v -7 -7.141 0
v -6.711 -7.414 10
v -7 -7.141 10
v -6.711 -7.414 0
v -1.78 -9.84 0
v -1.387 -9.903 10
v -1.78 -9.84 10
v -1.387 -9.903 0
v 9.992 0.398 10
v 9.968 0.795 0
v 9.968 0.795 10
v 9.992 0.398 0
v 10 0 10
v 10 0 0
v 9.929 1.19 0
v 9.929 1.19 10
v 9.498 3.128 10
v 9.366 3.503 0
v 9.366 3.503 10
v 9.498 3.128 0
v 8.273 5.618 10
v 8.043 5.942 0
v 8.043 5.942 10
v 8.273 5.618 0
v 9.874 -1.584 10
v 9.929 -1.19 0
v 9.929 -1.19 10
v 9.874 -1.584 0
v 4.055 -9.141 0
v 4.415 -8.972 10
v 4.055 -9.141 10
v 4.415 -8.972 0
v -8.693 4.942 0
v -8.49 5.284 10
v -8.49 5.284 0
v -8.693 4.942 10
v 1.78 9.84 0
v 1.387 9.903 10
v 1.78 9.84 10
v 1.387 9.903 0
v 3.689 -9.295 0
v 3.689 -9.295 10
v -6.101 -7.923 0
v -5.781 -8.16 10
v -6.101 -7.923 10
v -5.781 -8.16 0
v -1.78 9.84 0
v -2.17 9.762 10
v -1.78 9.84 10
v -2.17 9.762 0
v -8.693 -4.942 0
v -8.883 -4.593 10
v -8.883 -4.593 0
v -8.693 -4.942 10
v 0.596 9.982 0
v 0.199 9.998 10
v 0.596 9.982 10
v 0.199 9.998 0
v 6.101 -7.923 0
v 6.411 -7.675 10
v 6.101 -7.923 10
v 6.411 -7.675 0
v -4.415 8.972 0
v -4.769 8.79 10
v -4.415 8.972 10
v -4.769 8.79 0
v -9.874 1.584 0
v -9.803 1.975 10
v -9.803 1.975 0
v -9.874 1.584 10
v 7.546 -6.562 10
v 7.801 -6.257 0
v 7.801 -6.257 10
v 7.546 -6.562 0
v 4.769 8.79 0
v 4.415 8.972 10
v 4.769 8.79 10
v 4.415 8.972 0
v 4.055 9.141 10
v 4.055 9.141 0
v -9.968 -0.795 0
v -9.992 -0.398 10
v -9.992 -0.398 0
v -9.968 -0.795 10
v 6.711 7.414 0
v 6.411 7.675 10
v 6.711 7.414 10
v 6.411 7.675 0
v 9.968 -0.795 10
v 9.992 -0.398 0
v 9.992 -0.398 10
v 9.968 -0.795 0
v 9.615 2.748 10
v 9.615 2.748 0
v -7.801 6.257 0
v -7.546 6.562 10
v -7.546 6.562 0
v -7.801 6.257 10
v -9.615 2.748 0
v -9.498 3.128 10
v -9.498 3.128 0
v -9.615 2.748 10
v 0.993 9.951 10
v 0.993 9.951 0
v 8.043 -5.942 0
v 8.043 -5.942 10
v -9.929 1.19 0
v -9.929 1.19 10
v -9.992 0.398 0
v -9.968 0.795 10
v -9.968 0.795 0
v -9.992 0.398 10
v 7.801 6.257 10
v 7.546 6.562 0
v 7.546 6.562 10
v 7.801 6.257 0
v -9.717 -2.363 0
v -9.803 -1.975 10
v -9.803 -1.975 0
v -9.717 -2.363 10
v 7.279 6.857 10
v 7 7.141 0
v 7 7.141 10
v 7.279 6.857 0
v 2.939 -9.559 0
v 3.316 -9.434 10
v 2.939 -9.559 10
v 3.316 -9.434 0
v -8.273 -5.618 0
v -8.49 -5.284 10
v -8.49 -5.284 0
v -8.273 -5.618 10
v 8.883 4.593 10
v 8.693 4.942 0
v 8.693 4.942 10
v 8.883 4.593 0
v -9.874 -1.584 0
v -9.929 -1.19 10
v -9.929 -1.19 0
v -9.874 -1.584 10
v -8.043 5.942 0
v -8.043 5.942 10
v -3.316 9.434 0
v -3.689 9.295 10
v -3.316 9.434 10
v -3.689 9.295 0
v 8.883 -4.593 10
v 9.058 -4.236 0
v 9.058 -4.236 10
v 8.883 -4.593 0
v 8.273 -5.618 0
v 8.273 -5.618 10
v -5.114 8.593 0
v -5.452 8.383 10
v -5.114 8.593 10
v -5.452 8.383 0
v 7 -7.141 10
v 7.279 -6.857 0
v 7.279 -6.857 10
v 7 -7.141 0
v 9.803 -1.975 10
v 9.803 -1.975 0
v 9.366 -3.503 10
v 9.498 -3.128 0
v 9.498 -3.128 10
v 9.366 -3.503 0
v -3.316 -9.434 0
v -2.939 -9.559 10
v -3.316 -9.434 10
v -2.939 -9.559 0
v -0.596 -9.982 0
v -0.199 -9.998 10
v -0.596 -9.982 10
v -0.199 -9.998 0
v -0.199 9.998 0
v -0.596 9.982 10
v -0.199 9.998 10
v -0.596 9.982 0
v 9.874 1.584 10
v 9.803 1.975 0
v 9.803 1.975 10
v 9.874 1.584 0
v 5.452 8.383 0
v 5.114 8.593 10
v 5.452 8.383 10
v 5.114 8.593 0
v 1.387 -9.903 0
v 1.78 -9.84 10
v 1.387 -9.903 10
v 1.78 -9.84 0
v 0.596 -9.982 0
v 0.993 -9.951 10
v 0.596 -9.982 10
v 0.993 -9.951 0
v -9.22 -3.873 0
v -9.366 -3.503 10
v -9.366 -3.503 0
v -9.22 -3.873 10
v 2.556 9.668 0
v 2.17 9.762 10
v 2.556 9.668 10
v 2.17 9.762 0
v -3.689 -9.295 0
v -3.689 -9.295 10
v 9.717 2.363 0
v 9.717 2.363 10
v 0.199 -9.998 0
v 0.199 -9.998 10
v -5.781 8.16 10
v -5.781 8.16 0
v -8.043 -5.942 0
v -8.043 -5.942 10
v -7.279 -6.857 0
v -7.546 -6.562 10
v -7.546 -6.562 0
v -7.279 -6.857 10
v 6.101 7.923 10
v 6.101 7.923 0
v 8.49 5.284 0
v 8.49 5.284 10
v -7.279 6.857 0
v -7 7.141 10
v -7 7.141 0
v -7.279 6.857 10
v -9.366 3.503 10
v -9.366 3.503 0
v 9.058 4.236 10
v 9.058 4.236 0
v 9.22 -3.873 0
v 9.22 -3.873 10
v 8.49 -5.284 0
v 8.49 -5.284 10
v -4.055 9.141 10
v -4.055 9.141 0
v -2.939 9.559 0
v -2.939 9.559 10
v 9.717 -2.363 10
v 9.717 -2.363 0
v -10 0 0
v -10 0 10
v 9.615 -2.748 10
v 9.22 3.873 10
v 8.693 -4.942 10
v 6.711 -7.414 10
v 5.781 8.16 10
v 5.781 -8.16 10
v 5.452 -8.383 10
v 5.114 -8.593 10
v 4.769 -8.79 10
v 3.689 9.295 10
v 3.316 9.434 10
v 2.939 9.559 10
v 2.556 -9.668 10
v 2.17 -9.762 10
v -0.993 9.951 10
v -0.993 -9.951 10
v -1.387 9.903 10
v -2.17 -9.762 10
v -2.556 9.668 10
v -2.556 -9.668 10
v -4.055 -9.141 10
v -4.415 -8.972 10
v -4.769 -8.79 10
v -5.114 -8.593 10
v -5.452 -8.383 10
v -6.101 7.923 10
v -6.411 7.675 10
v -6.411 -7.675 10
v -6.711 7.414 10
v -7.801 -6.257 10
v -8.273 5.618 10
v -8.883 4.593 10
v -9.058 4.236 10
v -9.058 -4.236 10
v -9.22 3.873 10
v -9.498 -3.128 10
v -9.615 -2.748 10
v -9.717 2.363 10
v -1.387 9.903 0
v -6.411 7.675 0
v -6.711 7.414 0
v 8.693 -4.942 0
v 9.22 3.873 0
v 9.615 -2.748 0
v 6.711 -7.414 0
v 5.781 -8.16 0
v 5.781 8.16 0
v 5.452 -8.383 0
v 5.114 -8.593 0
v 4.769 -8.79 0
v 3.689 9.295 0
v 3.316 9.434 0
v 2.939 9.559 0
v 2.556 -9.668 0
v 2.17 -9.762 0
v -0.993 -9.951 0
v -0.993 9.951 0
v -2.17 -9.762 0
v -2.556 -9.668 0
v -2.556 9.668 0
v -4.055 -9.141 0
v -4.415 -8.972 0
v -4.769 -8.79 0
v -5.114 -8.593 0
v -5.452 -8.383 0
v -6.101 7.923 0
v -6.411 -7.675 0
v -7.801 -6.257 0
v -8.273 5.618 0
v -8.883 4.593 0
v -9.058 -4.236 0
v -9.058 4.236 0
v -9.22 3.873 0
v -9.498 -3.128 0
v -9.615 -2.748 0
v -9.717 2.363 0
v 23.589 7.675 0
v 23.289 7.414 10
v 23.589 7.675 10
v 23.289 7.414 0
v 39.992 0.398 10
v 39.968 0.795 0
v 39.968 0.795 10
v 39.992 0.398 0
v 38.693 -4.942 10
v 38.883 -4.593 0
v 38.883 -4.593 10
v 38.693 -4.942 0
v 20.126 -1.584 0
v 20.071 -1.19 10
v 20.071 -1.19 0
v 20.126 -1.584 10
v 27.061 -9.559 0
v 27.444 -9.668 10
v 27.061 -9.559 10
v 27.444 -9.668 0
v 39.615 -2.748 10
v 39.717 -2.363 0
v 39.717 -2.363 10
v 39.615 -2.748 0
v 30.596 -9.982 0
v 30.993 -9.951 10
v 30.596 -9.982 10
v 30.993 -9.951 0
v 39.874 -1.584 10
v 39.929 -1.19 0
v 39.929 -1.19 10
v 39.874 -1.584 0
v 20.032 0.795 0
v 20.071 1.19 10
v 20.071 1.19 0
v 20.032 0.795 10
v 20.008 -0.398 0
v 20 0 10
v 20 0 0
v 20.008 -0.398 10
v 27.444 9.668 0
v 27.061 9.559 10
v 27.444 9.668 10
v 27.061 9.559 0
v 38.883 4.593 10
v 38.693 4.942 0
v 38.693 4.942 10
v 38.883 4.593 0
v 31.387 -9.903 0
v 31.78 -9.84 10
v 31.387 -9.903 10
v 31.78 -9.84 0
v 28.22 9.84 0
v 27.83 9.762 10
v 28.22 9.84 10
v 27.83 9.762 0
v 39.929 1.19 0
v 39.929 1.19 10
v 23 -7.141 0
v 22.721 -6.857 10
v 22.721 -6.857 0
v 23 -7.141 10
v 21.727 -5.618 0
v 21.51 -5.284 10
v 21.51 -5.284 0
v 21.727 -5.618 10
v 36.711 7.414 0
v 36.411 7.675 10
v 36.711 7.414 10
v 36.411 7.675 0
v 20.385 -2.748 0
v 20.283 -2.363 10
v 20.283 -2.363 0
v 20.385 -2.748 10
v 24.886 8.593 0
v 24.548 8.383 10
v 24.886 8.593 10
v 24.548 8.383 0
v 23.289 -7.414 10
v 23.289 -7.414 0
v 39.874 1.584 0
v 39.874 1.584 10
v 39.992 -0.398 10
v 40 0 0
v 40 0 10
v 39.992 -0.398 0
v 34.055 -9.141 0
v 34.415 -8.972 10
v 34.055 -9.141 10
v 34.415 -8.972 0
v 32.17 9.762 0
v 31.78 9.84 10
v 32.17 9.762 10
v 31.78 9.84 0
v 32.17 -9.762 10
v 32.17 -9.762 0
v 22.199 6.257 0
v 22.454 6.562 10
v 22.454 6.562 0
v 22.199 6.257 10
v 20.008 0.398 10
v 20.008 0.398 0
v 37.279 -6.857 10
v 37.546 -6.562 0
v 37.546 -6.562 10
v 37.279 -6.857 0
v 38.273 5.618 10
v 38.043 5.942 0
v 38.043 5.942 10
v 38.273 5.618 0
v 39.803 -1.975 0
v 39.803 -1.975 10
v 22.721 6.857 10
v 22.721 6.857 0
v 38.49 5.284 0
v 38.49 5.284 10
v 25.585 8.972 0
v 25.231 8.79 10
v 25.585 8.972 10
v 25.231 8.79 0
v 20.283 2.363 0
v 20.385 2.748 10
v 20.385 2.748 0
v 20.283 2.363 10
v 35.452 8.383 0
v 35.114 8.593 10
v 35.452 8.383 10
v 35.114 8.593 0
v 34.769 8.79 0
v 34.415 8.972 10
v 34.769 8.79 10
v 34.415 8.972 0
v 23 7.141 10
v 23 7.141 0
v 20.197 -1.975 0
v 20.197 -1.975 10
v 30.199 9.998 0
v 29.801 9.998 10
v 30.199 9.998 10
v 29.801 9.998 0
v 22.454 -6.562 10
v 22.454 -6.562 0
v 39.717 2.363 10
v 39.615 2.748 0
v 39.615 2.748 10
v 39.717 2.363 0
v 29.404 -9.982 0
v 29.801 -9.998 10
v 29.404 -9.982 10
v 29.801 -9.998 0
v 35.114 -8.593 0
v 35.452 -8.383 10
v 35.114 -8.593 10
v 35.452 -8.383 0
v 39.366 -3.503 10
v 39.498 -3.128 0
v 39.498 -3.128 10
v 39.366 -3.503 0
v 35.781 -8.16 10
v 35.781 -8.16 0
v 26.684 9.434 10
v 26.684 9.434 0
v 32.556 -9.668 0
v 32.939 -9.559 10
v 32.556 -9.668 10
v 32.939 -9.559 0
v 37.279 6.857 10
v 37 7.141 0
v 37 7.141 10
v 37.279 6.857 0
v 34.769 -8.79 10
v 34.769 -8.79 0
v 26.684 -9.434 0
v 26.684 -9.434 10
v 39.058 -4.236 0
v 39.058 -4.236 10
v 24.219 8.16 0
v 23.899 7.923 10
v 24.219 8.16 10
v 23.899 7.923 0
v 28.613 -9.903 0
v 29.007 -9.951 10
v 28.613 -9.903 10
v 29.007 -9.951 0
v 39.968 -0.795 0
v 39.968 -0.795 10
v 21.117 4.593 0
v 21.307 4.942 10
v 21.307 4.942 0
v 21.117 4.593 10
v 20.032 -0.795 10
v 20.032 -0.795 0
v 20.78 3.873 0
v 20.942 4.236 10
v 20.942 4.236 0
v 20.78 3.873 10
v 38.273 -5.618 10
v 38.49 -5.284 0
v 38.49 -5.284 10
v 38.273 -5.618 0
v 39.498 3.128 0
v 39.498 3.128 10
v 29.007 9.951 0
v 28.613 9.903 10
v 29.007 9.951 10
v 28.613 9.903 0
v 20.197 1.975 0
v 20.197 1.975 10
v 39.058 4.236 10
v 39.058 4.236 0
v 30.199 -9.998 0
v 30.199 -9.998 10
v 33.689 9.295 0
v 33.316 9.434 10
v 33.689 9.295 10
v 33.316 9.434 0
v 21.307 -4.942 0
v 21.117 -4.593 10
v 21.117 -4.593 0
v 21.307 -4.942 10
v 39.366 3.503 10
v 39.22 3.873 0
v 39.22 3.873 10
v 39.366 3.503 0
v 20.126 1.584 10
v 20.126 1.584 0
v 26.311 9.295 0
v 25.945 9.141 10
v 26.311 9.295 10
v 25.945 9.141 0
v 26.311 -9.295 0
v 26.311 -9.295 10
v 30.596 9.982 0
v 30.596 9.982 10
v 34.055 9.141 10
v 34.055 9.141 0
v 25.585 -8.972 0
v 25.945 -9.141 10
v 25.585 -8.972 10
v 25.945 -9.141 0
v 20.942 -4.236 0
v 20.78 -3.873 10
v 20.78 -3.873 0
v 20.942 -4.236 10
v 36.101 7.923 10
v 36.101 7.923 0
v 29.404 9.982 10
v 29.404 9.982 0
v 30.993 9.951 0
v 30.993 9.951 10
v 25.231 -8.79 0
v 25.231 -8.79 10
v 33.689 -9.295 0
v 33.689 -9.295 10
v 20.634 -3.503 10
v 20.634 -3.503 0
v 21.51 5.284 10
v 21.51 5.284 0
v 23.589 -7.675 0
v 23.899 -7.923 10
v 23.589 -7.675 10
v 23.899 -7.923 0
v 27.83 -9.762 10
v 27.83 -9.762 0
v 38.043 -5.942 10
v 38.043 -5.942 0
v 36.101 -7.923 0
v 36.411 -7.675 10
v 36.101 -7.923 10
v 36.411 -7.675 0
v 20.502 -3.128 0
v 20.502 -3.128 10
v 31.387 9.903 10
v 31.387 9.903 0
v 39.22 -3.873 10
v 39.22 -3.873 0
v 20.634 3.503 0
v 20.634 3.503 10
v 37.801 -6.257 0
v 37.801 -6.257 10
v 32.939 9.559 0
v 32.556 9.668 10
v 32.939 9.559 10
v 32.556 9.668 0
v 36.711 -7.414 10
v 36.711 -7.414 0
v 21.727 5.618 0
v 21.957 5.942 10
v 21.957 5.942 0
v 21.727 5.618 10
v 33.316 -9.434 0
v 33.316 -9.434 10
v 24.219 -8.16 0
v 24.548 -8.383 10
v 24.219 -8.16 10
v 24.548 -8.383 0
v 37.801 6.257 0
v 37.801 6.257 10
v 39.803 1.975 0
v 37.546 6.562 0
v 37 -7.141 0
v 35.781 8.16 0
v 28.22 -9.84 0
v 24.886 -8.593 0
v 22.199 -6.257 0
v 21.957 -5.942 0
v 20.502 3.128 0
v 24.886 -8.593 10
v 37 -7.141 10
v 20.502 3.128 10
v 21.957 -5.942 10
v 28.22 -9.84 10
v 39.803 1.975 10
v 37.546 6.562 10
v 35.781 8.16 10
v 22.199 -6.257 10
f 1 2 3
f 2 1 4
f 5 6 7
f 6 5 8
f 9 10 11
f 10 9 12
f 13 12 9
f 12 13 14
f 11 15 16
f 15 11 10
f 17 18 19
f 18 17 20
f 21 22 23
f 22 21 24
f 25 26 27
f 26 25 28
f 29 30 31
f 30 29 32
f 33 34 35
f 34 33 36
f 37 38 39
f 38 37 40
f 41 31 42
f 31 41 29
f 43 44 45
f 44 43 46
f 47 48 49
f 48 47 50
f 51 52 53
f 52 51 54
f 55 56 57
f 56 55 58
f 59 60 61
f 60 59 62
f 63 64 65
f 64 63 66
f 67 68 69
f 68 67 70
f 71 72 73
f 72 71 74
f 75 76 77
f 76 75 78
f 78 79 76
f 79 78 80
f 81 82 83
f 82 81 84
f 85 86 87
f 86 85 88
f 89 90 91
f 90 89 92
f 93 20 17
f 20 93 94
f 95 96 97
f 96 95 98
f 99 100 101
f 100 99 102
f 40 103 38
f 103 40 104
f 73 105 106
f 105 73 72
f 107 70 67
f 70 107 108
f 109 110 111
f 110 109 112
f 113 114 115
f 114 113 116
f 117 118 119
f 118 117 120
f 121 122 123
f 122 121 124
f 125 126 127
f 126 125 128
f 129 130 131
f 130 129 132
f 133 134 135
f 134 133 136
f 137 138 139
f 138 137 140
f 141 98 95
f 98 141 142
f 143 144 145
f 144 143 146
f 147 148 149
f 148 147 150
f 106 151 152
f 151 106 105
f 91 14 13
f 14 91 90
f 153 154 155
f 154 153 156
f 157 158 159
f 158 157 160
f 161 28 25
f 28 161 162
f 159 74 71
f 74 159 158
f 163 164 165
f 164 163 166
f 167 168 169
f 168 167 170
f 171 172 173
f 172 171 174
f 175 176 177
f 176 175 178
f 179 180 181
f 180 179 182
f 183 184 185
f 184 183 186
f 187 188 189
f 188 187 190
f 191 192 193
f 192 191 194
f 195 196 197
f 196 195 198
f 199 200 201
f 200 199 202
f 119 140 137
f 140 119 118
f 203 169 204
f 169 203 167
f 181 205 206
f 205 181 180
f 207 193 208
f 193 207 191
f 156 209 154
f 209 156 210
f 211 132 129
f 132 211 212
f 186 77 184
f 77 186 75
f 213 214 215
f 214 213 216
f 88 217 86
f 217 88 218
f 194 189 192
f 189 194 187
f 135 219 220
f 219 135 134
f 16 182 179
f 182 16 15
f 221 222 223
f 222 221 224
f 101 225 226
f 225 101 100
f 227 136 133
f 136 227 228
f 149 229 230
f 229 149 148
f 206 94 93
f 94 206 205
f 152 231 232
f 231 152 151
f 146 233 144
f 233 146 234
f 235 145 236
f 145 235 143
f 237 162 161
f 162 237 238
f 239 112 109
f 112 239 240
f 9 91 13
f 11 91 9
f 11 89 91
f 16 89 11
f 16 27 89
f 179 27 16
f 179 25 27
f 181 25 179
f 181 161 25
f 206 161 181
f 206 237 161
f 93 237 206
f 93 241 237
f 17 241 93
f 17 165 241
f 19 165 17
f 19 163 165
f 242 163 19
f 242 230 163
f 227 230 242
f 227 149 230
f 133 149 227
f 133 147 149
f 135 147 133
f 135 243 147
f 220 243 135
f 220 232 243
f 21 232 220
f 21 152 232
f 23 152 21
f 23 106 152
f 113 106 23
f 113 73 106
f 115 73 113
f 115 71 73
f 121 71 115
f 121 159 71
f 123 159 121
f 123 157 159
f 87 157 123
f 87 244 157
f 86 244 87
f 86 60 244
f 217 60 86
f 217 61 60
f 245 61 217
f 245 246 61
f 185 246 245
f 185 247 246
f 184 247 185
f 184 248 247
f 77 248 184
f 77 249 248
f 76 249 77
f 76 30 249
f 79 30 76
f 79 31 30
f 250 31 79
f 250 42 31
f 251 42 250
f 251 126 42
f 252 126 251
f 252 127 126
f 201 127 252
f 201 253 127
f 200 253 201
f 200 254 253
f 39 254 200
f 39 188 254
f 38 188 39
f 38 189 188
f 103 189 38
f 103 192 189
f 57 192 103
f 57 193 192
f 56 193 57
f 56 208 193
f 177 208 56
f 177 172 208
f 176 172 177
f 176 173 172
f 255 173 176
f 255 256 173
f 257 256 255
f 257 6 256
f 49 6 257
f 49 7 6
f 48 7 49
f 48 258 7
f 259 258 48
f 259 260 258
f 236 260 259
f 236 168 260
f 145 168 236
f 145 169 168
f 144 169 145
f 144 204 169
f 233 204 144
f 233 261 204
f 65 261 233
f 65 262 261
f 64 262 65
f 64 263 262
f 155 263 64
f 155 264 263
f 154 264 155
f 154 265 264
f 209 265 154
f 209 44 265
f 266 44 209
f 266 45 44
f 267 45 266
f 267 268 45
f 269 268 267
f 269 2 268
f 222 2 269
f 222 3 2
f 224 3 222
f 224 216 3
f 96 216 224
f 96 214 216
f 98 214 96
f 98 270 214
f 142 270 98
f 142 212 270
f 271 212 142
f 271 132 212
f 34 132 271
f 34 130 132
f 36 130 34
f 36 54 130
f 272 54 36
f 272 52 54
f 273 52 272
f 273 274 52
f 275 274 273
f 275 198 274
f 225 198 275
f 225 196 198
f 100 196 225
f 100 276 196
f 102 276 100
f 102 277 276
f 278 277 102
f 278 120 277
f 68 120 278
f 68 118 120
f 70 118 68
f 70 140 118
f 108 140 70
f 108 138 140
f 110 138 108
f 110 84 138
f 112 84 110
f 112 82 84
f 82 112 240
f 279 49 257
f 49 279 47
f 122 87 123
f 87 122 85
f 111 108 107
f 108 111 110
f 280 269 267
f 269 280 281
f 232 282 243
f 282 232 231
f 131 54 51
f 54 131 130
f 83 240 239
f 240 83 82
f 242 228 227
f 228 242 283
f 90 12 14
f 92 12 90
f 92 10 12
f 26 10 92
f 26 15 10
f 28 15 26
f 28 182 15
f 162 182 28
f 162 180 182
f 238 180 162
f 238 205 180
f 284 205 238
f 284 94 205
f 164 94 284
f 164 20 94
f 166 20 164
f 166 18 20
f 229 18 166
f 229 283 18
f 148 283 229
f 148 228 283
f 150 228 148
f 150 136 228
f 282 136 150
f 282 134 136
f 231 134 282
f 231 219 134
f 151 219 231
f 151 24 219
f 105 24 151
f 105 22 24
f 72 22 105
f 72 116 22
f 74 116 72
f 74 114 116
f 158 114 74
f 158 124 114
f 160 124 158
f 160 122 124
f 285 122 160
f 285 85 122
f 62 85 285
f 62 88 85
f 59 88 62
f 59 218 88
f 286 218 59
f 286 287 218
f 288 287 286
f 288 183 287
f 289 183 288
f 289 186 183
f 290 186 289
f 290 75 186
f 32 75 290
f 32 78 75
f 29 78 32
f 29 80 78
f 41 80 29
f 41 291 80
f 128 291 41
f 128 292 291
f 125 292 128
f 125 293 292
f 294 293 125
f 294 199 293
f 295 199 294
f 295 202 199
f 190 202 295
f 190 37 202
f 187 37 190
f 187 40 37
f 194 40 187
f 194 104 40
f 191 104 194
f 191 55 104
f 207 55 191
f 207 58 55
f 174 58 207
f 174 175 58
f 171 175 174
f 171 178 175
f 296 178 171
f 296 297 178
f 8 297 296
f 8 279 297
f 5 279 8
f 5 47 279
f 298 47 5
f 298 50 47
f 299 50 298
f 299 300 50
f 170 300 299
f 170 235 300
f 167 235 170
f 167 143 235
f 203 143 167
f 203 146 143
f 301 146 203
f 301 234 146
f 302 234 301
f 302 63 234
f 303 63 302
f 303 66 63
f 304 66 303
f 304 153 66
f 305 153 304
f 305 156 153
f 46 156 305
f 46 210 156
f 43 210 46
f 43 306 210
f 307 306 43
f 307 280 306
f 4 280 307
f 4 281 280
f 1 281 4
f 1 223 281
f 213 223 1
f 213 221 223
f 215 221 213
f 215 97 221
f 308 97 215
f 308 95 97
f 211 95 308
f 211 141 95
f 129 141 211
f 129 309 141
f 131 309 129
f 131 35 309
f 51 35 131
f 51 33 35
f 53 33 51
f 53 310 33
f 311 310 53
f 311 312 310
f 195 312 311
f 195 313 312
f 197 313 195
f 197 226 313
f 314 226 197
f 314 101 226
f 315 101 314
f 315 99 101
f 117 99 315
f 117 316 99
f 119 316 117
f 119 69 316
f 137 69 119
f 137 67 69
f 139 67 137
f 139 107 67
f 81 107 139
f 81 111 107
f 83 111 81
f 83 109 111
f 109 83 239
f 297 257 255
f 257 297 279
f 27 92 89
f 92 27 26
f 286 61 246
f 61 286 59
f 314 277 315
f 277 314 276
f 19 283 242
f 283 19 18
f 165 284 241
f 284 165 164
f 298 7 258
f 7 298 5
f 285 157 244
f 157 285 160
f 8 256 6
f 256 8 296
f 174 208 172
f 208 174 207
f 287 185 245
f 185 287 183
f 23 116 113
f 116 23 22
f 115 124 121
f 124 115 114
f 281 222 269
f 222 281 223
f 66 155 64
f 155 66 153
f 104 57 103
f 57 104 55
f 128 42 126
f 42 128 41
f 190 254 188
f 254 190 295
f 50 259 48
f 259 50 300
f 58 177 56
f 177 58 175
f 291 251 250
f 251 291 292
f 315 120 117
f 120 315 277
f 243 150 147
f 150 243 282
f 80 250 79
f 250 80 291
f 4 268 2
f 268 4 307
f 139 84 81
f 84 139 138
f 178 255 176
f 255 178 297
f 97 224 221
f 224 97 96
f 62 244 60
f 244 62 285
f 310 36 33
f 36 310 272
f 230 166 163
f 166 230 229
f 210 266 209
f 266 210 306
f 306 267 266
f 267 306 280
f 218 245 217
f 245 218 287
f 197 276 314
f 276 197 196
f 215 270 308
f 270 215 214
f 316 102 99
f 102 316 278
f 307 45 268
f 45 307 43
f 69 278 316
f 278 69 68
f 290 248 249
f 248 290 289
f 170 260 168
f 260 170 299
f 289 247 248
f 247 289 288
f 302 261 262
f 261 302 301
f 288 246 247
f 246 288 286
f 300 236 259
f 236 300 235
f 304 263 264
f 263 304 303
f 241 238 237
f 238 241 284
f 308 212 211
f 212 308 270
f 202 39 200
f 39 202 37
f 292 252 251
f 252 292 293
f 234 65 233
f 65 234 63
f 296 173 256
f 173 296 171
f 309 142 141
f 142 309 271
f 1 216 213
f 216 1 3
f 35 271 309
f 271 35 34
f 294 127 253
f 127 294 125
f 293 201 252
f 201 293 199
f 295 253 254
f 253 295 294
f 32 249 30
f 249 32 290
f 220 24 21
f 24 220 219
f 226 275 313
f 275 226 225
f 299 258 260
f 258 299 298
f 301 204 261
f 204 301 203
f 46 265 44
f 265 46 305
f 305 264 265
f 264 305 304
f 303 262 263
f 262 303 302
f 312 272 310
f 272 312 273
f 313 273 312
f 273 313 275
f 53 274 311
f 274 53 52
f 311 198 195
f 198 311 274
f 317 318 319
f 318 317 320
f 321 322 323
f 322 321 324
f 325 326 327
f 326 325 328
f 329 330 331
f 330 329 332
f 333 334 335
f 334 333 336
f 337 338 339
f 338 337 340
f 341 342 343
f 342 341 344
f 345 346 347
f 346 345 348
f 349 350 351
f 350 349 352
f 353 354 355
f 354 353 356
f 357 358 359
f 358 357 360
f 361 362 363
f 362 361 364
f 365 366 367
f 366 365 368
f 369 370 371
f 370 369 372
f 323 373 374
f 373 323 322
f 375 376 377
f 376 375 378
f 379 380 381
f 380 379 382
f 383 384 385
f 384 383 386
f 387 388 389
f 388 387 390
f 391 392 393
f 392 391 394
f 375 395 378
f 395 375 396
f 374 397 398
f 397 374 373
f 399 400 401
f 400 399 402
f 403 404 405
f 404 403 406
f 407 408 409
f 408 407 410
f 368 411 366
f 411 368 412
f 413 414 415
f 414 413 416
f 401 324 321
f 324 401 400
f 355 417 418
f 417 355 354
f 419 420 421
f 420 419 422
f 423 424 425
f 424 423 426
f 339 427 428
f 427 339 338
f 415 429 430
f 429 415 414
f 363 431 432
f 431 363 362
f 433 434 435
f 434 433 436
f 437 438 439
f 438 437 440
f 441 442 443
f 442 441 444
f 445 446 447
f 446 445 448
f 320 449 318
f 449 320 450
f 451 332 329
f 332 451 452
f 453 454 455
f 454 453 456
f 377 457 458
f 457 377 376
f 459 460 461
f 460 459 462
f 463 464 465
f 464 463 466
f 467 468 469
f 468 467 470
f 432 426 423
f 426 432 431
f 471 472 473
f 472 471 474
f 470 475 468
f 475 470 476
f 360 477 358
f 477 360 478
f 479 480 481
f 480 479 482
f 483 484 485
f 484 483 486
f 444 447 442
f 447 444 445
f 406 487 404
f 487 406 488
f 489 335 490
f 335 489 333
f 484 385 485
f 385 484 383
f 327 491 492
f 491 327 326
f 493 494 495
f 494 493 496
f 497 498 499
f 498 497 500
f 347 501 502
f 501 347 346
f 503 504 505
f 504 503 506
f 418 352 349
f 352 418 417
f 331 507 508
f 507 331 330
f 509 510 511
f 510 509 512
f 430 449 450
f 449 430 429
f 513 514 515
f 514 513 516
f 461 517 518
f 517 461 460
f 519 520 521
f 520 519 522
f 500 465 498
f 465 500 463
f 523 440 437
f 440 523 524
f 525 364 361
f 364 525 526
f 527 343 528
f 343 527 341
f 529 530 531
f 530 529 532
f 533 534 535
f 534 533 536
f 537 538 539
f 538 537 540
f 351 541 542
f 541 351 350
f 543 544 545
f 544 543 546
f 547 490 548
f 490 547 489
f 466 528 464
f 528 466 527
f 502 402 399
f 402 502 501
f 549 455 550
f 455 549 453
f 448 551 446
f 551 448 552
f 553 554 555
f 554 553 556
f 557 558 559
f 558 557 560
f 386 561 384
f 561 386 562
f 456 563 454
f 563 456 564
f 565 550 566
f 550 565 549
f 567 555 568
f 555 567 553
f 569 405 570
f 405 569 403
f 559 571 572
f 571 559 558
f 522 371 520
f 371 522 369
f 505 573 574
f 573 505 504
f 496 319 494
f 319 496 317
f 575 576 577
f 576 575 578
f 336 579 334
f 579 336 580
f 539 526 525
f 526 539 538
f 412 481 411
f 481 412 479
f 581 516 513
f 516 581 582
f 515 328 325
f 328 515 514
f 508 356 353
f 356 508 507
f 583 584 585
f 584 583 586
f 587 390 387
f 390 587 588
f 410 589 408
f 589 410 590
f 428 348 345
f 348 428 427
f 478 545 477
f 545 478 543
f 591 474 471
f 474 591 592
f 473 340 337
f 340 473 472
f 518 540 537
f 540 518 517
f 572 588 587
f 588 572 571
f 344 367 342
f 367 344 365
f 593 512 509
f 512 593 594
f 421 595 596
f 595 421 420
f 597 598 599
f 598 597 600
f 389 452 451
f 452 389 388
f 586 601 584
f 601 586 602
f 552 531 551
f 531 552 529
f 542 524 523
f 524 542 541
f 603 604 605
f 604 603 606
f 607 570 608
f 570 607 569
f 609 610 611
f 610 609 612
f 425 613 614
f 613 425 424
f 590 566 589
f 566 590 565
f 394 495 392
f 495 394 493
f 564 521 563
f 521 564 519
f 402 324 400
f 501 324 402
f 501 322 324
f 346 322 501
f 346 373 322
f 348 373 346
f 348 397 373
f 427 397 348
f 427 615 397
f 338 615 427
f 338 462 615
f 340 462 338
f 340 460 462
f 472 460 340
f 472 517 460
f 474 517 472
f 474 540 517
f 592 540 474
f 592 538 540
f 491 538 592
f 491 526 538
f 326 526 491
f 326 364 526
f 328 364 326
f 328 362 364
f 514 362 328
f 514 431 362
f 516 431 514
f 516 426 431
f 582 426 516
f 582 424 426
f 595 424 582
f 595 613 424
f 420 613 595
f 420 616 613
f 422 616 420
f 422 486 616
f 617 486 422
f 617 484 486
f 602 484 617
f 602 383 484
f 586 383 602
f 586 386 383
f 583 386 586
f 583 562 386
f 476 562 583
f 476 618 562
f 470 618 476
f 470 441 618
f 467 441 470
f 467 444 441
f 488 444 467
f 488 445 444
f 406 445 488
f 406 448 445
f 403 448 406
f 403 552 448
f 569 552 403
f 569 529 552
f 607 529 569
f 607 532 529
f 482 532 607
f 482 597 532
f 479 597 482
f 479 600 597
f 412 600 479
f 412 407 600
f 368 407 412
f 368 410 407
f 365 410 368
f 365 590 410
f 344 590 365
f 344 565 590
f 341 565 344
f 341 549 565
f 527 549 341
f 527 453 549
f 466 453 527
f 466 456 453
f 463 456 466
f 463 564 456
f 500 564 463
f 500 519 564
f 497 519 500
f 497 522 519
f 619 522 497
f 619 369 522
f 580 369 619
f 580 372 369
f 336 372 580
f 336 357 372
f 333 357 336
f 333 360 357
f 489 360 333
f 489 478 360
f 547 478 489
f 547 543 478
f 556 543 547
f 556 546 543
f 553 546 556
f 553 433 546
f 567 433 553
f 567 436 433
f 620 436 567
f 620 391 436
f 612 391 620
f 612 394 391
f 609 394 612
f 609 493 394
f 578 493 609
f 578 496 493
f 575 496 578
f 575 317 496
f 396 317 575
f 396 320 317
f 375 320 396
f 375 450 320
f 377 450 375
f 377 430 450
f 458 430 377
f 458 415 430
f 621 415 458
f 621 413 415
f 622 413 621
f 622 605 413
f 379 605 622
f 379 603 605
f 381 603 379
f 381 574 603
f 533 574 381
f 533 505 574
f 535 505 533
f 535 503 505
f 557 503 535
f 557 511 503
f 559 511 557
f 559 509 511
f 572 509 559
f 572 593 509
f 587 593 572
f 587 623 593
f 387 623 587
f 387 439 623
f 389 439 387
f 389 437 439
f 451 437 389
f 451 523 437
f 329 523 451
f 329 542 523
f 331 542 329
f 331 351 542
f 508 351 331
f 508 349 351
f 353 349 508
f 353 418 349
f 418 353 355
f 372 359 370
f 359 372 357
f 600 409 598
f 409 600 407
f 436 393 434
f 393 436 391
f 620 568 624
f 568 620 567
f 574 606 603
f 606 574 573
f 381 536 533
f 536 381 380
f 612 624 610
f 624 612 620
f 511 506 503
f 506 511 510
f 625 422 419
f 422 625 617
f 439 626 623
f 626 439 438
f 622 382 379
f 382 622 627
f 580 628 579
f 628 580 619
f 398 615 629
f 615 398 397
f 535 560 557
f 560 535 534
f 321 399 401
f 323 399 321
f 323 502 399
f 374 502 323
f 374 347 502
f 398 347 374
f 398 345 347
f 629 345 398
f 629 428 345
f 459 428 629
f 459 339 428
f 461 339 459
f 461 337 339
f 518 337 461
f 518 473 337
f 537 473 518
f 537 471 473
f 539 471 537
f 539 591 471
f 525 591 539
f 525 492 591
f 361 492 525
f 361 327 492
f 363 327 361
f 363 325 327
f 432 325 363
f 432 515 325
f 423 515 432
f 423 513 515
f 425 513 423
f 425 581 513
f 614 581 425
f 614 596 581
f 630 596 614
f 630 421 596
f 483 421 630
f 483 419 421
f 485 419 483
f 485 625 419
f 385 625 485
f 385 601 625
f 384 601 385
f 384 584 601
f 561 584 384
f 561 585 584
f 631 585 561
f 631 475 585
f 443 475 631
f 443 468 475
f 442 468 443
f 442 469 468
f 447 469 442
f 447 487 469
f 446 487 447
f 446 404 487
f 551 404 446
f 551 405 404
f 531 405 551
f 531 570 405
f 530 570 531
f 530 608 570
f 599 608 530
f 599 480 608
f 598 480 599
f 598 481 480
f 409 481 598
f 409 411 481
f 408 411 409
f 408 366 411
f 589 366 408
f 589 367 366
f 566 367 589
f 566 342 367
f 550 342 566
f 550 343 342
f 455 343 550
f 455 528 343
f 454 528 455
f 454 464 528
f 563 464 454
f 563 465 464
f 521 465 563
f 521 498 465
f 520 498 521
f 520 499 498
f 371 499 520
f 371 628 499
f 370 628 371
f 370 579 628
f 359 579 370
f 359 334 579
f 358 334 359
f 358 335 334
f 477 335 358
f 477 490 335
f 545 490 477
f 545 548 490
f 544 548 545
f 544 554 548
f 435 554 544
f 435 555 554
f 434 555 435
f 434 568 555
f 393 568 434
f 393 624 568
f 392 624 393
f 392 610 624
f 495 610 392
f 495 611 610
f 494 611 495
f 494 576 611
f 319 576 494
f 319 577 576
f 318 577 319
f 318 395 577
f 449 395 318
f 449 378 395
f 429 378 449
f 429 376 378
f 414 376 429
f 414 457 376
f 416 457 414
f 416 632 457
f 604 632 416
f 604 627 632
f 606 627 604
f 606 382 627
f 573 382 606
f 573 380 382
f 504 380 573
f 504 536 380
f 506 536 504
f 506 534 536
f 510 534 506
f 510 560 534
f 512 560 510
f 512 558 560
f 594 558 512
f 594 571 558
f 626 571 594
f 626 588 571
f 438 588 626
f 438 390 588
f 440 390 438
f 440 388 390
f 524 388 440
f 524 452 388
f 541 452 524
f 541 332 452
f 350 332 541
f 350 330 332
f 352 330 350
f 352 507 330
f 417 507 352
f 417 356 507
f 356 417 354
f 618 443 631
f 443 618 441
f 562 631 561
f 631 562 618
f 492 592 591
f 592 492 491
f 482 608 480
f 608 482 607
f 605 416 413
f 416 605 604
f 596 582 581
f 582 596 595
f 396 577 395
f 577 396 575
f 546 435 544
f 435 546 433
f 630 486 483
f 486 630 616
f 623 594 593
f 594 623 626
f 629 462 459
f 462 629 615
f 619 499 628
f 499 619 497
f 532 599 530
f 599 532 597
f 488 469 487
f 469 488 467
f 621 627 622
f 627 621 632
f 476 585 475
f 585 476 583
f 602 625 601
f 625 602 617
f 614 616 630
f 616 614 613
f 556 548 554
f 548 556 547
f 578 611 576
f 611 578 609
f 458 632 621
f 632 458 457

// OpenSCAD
$fa=1;
$fs=0.4;

height=10;
//radius=5;
radius=10;

cylinder(h=height, r=radius);

translate([30,0,0,])
    cylinder(h=height, r=radius);
